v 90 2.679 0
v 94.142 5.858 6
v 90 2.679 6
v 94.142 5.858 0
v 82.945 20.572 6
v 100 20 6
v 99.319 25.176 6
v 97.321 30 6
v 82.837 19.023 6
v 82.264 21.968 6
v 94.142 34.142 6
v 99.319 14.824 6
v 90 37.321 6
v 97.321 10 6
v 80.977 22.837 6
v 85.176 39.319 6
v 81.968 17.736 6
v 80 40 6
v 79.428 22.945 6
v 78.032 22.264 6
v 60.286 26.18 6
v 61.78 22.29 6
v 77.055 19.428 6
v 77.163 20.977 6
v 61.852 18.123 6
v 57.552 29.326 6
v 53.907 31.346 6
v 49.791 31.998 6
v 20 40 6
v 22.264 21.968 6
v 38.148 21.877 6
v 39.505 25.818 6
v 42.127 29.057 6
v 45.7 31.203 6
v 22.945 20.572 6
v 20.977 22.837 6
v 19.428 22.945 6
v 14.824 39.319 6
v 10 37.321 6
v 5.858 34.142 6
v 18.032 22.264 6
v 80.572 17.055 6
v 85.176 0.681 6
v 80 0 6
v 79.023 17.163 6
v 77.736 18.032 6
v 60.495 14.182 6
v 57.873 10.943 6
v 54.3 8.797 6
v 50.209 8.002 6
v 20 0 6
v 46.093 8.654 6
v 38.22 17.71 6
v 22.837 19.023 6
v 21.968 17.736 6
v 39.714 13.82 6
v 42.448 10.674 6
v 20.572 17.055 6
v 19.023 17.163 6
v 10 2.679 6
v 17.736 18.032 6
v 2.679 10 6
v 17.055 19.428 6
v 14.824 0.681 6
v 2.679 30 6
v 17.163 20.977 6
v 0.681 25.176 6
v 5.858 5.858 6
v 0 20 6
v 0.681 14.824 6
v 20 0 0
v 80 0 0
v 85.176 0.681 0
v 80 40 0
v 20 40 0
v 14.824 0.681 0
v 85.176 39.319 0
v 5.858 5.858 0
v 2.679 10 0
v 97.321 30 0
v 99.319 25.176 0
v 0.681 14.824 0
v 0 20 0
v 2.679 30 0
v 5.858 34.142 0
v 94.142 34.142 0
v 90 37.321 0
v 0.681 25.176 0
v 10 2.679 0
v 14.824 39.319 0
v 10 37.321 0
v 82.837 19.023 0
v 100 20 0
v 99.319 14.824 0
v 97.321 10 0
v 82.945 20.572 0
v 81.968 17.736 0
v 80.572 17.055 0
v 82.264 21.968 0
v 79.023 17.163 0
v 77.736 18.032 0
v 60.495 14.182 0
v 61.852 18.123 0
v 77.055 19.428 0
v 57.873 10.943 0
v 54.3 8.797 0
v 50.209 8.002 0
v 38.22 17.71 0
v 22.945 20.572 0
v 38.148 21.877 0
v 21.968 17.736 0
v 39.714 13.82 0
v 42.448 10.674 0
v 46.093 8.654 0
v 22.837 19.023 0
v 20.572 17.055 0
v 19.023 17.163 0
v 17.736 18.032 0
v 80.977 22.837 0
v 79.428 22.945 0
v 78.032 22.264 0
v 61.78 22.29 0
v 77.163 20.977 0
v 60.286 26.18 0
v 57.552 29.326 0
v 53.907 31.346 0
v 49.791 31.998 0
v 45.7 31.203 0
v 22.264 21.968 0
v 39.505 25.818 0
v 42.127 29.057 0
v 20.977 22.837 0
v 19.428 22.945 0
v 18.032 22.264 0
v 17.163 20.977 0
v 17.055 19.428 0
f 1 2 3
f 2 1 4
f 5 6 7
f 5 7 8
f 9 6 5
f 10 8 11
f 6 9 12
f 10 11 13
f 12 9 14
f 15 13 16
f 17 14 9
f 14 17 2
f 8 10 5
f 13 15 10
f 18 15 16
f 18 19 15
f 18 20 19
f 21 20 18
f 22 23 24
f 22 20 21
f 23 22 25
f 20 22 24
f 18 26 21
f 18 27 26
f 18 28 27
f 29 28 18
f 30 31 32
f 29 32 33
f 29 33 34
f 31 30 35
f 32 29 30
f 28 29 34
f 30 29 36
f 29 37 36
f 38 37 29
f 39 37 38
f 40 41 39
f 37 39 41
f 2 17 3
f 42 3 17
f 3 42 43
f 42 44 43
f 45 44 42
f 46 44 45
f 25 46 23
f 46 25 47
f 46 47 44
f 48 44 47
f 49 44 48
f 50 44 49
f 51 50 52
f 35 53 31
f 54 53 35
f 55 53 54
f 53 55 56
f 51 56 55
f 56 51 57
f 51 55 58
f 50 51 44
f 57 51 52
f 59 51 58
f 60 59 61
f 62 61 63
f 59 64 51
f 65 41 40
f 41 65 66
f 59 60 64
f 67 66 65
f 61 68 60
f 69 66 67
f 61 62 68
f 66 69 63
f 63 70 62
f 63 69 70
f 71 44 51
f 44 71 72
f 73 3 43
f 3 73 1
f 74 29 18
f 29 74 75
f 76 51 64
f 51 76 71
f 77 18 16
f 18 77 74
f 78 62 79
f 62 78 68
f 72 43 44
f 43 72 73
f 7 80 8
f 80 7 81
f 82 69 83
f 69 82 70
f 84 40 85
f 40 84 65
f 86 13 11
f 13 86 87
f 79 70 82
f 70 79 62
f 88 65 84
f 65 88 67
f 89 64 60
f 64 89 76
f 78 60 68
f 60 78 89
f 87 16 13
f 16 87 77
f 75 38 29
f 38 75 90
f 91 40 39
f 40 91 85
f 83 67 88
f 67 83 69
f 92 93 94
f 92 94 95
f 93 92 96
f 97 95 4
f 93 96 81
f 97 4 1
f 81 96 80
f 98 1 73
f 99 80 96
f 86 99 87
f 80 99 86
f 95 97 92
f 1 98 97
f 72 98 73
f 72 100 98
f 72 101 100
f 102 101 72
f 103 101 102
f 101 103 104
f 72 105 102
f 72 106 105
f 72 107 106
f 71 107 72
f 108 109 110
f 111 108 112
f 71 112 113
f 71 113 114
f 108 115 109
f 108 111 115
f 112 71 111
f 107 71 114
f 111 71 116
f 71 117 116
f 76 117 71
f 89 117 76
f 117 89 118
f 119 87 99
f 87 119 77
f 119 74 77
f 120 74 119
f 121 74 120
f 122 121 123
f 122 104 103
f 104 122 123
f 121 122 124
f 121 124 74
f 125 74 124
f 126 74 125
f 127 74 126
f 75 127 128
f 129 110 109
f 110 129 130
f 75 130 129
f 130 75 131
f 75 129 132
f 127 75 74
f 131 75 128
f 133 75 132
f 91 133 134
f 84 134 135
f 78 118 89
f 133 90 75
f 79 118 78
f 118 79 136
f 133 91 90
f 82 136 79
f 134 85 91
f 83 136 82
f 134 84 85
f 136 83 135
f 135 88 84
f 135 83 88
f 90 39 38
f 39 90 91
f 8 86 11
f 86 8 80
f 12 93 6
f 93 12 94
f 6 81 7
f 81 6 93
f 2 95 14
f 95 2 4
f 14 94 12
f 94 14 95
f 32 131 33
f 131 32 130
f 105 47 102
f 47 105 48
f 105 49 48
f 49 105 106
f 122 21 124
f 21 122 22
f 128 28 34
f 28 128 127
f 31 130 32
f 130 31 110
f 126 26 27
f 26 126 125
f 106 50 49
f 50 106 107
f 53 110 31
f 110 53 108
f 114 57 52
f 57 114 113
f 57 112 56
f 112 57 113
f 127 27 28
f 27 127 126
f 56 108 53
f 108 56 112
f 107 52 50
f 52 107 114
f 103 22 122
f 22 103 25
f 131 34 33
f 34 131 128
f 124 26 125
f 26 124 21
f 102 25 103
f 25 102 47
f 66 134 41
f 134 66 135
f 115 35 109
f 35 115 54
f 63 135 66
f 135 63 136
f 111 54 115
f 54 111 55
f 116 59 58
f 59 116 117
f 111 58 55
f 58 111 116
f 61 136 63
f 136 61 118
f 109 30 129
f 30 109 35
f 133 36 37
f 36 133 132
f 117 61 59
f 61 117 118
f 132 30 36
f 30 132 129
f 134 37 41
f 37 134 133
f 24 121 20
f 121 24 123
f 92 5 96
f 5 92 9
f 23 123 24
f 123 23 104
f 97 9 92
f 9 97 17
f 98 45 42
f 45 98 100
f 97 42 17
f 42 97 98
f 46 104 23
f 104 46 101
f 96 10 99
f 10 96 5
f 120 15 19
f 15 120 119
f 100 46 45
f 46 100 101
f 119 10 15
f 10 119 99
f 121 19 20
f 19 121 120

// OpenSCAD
$fn = 32;

// ----------------------------------------------------------------------
// Spacer plate: obround span 60, caps R20
// ----------------------------------------------------------------------

// --- parameters (mm) ---
bore_r = 12;              // centre bore radius
bolt_r = 3;               // bolt hole radius
plate_t = 6;              // plate thickness, Z (extrusion height)
span = 60;                // obround span
cap_r = 20;               // cap radius
fit_tol = 0.02;           // declared fit tolerance (prompt contract)
free_tol = 0.2;           // declared free tolerance (prompt contract)

profile = [[20, 40], [14.824, 39.319], [10, 37.321], [5.858, 34.142], [2.679, 30], [0.681, 25.176], [0, 20], [0.681, 14.824], [2.679, 10], [5.858, 5.858], [10, 2.679], [14.824, 0.681], [20, 0], [80, 0], [85.176, 0.681], [90, 2.679], [94.142, 5.858], [97.321, 10], [99.319, 14.824], [100, 20], [99.319, 25.176], [97.321, 30], [94.142, 34.142], [90, 37.321], [85.176, 39.319], [80, 40]];  // primary outline, 26 points, counter clockwise
void_1 = [[61.78, 22.29], [60.286, 26.18], [57.552, 29.326], [53.907, 31.346], [49.791, 31.998], [45.7, 31.203], [42.127, 29.057], [39.505, 25.818], [38.148, 21.877], [38.22, 17.71], [39.714, 13.82], [42.448, 10.674], [46.093, 8.654], [50.209, 8.002], [54.3, 8.797], [57.873, 10.943], [60.495, 14.182], [61.852, 18.123]];  // centre bore, 18 points
void_2 = [[22.945, 20.572], [22.264, 21.968], [20.977, 22.837], [19.428, 22.945], [18.032, 22.264], [17.163, 20.977], [17.055, 19.428], [17.736, 18.032], [19.023, 17.163], [20.572, 17.055], [21.968, 17.736], [22.837, 19.023]];  // end hole, 12 points
void_3 = [[82.945, 20.572], [82.264, 21.968], [80.977, 22.837], [79.428, 22.945], [78.032, 22.264], [77.163, 20.977], [77.055, 19.428], [77.736, 18.032], [79.023, 17.163], [80.572, 17.055], [81.968, 17.736], [82.837, 19.023]];  // end hole, 12 points

// --- the one profile operation ---
difference() {
  linear_extrude(height = plate_t) polygon(points = profile);
  translate([0, 0, -1])
    linear_extrude(height = plate_t + 2) polygon(points = void_1);
  translate([0, 0, -1])
    linear_extrude(height = plate_t + 2) polygon(points = void_2);
  translate([0, 0, -1])
    linear_extrude(height = plate_t + 2) polygon(points = void_3);
}
